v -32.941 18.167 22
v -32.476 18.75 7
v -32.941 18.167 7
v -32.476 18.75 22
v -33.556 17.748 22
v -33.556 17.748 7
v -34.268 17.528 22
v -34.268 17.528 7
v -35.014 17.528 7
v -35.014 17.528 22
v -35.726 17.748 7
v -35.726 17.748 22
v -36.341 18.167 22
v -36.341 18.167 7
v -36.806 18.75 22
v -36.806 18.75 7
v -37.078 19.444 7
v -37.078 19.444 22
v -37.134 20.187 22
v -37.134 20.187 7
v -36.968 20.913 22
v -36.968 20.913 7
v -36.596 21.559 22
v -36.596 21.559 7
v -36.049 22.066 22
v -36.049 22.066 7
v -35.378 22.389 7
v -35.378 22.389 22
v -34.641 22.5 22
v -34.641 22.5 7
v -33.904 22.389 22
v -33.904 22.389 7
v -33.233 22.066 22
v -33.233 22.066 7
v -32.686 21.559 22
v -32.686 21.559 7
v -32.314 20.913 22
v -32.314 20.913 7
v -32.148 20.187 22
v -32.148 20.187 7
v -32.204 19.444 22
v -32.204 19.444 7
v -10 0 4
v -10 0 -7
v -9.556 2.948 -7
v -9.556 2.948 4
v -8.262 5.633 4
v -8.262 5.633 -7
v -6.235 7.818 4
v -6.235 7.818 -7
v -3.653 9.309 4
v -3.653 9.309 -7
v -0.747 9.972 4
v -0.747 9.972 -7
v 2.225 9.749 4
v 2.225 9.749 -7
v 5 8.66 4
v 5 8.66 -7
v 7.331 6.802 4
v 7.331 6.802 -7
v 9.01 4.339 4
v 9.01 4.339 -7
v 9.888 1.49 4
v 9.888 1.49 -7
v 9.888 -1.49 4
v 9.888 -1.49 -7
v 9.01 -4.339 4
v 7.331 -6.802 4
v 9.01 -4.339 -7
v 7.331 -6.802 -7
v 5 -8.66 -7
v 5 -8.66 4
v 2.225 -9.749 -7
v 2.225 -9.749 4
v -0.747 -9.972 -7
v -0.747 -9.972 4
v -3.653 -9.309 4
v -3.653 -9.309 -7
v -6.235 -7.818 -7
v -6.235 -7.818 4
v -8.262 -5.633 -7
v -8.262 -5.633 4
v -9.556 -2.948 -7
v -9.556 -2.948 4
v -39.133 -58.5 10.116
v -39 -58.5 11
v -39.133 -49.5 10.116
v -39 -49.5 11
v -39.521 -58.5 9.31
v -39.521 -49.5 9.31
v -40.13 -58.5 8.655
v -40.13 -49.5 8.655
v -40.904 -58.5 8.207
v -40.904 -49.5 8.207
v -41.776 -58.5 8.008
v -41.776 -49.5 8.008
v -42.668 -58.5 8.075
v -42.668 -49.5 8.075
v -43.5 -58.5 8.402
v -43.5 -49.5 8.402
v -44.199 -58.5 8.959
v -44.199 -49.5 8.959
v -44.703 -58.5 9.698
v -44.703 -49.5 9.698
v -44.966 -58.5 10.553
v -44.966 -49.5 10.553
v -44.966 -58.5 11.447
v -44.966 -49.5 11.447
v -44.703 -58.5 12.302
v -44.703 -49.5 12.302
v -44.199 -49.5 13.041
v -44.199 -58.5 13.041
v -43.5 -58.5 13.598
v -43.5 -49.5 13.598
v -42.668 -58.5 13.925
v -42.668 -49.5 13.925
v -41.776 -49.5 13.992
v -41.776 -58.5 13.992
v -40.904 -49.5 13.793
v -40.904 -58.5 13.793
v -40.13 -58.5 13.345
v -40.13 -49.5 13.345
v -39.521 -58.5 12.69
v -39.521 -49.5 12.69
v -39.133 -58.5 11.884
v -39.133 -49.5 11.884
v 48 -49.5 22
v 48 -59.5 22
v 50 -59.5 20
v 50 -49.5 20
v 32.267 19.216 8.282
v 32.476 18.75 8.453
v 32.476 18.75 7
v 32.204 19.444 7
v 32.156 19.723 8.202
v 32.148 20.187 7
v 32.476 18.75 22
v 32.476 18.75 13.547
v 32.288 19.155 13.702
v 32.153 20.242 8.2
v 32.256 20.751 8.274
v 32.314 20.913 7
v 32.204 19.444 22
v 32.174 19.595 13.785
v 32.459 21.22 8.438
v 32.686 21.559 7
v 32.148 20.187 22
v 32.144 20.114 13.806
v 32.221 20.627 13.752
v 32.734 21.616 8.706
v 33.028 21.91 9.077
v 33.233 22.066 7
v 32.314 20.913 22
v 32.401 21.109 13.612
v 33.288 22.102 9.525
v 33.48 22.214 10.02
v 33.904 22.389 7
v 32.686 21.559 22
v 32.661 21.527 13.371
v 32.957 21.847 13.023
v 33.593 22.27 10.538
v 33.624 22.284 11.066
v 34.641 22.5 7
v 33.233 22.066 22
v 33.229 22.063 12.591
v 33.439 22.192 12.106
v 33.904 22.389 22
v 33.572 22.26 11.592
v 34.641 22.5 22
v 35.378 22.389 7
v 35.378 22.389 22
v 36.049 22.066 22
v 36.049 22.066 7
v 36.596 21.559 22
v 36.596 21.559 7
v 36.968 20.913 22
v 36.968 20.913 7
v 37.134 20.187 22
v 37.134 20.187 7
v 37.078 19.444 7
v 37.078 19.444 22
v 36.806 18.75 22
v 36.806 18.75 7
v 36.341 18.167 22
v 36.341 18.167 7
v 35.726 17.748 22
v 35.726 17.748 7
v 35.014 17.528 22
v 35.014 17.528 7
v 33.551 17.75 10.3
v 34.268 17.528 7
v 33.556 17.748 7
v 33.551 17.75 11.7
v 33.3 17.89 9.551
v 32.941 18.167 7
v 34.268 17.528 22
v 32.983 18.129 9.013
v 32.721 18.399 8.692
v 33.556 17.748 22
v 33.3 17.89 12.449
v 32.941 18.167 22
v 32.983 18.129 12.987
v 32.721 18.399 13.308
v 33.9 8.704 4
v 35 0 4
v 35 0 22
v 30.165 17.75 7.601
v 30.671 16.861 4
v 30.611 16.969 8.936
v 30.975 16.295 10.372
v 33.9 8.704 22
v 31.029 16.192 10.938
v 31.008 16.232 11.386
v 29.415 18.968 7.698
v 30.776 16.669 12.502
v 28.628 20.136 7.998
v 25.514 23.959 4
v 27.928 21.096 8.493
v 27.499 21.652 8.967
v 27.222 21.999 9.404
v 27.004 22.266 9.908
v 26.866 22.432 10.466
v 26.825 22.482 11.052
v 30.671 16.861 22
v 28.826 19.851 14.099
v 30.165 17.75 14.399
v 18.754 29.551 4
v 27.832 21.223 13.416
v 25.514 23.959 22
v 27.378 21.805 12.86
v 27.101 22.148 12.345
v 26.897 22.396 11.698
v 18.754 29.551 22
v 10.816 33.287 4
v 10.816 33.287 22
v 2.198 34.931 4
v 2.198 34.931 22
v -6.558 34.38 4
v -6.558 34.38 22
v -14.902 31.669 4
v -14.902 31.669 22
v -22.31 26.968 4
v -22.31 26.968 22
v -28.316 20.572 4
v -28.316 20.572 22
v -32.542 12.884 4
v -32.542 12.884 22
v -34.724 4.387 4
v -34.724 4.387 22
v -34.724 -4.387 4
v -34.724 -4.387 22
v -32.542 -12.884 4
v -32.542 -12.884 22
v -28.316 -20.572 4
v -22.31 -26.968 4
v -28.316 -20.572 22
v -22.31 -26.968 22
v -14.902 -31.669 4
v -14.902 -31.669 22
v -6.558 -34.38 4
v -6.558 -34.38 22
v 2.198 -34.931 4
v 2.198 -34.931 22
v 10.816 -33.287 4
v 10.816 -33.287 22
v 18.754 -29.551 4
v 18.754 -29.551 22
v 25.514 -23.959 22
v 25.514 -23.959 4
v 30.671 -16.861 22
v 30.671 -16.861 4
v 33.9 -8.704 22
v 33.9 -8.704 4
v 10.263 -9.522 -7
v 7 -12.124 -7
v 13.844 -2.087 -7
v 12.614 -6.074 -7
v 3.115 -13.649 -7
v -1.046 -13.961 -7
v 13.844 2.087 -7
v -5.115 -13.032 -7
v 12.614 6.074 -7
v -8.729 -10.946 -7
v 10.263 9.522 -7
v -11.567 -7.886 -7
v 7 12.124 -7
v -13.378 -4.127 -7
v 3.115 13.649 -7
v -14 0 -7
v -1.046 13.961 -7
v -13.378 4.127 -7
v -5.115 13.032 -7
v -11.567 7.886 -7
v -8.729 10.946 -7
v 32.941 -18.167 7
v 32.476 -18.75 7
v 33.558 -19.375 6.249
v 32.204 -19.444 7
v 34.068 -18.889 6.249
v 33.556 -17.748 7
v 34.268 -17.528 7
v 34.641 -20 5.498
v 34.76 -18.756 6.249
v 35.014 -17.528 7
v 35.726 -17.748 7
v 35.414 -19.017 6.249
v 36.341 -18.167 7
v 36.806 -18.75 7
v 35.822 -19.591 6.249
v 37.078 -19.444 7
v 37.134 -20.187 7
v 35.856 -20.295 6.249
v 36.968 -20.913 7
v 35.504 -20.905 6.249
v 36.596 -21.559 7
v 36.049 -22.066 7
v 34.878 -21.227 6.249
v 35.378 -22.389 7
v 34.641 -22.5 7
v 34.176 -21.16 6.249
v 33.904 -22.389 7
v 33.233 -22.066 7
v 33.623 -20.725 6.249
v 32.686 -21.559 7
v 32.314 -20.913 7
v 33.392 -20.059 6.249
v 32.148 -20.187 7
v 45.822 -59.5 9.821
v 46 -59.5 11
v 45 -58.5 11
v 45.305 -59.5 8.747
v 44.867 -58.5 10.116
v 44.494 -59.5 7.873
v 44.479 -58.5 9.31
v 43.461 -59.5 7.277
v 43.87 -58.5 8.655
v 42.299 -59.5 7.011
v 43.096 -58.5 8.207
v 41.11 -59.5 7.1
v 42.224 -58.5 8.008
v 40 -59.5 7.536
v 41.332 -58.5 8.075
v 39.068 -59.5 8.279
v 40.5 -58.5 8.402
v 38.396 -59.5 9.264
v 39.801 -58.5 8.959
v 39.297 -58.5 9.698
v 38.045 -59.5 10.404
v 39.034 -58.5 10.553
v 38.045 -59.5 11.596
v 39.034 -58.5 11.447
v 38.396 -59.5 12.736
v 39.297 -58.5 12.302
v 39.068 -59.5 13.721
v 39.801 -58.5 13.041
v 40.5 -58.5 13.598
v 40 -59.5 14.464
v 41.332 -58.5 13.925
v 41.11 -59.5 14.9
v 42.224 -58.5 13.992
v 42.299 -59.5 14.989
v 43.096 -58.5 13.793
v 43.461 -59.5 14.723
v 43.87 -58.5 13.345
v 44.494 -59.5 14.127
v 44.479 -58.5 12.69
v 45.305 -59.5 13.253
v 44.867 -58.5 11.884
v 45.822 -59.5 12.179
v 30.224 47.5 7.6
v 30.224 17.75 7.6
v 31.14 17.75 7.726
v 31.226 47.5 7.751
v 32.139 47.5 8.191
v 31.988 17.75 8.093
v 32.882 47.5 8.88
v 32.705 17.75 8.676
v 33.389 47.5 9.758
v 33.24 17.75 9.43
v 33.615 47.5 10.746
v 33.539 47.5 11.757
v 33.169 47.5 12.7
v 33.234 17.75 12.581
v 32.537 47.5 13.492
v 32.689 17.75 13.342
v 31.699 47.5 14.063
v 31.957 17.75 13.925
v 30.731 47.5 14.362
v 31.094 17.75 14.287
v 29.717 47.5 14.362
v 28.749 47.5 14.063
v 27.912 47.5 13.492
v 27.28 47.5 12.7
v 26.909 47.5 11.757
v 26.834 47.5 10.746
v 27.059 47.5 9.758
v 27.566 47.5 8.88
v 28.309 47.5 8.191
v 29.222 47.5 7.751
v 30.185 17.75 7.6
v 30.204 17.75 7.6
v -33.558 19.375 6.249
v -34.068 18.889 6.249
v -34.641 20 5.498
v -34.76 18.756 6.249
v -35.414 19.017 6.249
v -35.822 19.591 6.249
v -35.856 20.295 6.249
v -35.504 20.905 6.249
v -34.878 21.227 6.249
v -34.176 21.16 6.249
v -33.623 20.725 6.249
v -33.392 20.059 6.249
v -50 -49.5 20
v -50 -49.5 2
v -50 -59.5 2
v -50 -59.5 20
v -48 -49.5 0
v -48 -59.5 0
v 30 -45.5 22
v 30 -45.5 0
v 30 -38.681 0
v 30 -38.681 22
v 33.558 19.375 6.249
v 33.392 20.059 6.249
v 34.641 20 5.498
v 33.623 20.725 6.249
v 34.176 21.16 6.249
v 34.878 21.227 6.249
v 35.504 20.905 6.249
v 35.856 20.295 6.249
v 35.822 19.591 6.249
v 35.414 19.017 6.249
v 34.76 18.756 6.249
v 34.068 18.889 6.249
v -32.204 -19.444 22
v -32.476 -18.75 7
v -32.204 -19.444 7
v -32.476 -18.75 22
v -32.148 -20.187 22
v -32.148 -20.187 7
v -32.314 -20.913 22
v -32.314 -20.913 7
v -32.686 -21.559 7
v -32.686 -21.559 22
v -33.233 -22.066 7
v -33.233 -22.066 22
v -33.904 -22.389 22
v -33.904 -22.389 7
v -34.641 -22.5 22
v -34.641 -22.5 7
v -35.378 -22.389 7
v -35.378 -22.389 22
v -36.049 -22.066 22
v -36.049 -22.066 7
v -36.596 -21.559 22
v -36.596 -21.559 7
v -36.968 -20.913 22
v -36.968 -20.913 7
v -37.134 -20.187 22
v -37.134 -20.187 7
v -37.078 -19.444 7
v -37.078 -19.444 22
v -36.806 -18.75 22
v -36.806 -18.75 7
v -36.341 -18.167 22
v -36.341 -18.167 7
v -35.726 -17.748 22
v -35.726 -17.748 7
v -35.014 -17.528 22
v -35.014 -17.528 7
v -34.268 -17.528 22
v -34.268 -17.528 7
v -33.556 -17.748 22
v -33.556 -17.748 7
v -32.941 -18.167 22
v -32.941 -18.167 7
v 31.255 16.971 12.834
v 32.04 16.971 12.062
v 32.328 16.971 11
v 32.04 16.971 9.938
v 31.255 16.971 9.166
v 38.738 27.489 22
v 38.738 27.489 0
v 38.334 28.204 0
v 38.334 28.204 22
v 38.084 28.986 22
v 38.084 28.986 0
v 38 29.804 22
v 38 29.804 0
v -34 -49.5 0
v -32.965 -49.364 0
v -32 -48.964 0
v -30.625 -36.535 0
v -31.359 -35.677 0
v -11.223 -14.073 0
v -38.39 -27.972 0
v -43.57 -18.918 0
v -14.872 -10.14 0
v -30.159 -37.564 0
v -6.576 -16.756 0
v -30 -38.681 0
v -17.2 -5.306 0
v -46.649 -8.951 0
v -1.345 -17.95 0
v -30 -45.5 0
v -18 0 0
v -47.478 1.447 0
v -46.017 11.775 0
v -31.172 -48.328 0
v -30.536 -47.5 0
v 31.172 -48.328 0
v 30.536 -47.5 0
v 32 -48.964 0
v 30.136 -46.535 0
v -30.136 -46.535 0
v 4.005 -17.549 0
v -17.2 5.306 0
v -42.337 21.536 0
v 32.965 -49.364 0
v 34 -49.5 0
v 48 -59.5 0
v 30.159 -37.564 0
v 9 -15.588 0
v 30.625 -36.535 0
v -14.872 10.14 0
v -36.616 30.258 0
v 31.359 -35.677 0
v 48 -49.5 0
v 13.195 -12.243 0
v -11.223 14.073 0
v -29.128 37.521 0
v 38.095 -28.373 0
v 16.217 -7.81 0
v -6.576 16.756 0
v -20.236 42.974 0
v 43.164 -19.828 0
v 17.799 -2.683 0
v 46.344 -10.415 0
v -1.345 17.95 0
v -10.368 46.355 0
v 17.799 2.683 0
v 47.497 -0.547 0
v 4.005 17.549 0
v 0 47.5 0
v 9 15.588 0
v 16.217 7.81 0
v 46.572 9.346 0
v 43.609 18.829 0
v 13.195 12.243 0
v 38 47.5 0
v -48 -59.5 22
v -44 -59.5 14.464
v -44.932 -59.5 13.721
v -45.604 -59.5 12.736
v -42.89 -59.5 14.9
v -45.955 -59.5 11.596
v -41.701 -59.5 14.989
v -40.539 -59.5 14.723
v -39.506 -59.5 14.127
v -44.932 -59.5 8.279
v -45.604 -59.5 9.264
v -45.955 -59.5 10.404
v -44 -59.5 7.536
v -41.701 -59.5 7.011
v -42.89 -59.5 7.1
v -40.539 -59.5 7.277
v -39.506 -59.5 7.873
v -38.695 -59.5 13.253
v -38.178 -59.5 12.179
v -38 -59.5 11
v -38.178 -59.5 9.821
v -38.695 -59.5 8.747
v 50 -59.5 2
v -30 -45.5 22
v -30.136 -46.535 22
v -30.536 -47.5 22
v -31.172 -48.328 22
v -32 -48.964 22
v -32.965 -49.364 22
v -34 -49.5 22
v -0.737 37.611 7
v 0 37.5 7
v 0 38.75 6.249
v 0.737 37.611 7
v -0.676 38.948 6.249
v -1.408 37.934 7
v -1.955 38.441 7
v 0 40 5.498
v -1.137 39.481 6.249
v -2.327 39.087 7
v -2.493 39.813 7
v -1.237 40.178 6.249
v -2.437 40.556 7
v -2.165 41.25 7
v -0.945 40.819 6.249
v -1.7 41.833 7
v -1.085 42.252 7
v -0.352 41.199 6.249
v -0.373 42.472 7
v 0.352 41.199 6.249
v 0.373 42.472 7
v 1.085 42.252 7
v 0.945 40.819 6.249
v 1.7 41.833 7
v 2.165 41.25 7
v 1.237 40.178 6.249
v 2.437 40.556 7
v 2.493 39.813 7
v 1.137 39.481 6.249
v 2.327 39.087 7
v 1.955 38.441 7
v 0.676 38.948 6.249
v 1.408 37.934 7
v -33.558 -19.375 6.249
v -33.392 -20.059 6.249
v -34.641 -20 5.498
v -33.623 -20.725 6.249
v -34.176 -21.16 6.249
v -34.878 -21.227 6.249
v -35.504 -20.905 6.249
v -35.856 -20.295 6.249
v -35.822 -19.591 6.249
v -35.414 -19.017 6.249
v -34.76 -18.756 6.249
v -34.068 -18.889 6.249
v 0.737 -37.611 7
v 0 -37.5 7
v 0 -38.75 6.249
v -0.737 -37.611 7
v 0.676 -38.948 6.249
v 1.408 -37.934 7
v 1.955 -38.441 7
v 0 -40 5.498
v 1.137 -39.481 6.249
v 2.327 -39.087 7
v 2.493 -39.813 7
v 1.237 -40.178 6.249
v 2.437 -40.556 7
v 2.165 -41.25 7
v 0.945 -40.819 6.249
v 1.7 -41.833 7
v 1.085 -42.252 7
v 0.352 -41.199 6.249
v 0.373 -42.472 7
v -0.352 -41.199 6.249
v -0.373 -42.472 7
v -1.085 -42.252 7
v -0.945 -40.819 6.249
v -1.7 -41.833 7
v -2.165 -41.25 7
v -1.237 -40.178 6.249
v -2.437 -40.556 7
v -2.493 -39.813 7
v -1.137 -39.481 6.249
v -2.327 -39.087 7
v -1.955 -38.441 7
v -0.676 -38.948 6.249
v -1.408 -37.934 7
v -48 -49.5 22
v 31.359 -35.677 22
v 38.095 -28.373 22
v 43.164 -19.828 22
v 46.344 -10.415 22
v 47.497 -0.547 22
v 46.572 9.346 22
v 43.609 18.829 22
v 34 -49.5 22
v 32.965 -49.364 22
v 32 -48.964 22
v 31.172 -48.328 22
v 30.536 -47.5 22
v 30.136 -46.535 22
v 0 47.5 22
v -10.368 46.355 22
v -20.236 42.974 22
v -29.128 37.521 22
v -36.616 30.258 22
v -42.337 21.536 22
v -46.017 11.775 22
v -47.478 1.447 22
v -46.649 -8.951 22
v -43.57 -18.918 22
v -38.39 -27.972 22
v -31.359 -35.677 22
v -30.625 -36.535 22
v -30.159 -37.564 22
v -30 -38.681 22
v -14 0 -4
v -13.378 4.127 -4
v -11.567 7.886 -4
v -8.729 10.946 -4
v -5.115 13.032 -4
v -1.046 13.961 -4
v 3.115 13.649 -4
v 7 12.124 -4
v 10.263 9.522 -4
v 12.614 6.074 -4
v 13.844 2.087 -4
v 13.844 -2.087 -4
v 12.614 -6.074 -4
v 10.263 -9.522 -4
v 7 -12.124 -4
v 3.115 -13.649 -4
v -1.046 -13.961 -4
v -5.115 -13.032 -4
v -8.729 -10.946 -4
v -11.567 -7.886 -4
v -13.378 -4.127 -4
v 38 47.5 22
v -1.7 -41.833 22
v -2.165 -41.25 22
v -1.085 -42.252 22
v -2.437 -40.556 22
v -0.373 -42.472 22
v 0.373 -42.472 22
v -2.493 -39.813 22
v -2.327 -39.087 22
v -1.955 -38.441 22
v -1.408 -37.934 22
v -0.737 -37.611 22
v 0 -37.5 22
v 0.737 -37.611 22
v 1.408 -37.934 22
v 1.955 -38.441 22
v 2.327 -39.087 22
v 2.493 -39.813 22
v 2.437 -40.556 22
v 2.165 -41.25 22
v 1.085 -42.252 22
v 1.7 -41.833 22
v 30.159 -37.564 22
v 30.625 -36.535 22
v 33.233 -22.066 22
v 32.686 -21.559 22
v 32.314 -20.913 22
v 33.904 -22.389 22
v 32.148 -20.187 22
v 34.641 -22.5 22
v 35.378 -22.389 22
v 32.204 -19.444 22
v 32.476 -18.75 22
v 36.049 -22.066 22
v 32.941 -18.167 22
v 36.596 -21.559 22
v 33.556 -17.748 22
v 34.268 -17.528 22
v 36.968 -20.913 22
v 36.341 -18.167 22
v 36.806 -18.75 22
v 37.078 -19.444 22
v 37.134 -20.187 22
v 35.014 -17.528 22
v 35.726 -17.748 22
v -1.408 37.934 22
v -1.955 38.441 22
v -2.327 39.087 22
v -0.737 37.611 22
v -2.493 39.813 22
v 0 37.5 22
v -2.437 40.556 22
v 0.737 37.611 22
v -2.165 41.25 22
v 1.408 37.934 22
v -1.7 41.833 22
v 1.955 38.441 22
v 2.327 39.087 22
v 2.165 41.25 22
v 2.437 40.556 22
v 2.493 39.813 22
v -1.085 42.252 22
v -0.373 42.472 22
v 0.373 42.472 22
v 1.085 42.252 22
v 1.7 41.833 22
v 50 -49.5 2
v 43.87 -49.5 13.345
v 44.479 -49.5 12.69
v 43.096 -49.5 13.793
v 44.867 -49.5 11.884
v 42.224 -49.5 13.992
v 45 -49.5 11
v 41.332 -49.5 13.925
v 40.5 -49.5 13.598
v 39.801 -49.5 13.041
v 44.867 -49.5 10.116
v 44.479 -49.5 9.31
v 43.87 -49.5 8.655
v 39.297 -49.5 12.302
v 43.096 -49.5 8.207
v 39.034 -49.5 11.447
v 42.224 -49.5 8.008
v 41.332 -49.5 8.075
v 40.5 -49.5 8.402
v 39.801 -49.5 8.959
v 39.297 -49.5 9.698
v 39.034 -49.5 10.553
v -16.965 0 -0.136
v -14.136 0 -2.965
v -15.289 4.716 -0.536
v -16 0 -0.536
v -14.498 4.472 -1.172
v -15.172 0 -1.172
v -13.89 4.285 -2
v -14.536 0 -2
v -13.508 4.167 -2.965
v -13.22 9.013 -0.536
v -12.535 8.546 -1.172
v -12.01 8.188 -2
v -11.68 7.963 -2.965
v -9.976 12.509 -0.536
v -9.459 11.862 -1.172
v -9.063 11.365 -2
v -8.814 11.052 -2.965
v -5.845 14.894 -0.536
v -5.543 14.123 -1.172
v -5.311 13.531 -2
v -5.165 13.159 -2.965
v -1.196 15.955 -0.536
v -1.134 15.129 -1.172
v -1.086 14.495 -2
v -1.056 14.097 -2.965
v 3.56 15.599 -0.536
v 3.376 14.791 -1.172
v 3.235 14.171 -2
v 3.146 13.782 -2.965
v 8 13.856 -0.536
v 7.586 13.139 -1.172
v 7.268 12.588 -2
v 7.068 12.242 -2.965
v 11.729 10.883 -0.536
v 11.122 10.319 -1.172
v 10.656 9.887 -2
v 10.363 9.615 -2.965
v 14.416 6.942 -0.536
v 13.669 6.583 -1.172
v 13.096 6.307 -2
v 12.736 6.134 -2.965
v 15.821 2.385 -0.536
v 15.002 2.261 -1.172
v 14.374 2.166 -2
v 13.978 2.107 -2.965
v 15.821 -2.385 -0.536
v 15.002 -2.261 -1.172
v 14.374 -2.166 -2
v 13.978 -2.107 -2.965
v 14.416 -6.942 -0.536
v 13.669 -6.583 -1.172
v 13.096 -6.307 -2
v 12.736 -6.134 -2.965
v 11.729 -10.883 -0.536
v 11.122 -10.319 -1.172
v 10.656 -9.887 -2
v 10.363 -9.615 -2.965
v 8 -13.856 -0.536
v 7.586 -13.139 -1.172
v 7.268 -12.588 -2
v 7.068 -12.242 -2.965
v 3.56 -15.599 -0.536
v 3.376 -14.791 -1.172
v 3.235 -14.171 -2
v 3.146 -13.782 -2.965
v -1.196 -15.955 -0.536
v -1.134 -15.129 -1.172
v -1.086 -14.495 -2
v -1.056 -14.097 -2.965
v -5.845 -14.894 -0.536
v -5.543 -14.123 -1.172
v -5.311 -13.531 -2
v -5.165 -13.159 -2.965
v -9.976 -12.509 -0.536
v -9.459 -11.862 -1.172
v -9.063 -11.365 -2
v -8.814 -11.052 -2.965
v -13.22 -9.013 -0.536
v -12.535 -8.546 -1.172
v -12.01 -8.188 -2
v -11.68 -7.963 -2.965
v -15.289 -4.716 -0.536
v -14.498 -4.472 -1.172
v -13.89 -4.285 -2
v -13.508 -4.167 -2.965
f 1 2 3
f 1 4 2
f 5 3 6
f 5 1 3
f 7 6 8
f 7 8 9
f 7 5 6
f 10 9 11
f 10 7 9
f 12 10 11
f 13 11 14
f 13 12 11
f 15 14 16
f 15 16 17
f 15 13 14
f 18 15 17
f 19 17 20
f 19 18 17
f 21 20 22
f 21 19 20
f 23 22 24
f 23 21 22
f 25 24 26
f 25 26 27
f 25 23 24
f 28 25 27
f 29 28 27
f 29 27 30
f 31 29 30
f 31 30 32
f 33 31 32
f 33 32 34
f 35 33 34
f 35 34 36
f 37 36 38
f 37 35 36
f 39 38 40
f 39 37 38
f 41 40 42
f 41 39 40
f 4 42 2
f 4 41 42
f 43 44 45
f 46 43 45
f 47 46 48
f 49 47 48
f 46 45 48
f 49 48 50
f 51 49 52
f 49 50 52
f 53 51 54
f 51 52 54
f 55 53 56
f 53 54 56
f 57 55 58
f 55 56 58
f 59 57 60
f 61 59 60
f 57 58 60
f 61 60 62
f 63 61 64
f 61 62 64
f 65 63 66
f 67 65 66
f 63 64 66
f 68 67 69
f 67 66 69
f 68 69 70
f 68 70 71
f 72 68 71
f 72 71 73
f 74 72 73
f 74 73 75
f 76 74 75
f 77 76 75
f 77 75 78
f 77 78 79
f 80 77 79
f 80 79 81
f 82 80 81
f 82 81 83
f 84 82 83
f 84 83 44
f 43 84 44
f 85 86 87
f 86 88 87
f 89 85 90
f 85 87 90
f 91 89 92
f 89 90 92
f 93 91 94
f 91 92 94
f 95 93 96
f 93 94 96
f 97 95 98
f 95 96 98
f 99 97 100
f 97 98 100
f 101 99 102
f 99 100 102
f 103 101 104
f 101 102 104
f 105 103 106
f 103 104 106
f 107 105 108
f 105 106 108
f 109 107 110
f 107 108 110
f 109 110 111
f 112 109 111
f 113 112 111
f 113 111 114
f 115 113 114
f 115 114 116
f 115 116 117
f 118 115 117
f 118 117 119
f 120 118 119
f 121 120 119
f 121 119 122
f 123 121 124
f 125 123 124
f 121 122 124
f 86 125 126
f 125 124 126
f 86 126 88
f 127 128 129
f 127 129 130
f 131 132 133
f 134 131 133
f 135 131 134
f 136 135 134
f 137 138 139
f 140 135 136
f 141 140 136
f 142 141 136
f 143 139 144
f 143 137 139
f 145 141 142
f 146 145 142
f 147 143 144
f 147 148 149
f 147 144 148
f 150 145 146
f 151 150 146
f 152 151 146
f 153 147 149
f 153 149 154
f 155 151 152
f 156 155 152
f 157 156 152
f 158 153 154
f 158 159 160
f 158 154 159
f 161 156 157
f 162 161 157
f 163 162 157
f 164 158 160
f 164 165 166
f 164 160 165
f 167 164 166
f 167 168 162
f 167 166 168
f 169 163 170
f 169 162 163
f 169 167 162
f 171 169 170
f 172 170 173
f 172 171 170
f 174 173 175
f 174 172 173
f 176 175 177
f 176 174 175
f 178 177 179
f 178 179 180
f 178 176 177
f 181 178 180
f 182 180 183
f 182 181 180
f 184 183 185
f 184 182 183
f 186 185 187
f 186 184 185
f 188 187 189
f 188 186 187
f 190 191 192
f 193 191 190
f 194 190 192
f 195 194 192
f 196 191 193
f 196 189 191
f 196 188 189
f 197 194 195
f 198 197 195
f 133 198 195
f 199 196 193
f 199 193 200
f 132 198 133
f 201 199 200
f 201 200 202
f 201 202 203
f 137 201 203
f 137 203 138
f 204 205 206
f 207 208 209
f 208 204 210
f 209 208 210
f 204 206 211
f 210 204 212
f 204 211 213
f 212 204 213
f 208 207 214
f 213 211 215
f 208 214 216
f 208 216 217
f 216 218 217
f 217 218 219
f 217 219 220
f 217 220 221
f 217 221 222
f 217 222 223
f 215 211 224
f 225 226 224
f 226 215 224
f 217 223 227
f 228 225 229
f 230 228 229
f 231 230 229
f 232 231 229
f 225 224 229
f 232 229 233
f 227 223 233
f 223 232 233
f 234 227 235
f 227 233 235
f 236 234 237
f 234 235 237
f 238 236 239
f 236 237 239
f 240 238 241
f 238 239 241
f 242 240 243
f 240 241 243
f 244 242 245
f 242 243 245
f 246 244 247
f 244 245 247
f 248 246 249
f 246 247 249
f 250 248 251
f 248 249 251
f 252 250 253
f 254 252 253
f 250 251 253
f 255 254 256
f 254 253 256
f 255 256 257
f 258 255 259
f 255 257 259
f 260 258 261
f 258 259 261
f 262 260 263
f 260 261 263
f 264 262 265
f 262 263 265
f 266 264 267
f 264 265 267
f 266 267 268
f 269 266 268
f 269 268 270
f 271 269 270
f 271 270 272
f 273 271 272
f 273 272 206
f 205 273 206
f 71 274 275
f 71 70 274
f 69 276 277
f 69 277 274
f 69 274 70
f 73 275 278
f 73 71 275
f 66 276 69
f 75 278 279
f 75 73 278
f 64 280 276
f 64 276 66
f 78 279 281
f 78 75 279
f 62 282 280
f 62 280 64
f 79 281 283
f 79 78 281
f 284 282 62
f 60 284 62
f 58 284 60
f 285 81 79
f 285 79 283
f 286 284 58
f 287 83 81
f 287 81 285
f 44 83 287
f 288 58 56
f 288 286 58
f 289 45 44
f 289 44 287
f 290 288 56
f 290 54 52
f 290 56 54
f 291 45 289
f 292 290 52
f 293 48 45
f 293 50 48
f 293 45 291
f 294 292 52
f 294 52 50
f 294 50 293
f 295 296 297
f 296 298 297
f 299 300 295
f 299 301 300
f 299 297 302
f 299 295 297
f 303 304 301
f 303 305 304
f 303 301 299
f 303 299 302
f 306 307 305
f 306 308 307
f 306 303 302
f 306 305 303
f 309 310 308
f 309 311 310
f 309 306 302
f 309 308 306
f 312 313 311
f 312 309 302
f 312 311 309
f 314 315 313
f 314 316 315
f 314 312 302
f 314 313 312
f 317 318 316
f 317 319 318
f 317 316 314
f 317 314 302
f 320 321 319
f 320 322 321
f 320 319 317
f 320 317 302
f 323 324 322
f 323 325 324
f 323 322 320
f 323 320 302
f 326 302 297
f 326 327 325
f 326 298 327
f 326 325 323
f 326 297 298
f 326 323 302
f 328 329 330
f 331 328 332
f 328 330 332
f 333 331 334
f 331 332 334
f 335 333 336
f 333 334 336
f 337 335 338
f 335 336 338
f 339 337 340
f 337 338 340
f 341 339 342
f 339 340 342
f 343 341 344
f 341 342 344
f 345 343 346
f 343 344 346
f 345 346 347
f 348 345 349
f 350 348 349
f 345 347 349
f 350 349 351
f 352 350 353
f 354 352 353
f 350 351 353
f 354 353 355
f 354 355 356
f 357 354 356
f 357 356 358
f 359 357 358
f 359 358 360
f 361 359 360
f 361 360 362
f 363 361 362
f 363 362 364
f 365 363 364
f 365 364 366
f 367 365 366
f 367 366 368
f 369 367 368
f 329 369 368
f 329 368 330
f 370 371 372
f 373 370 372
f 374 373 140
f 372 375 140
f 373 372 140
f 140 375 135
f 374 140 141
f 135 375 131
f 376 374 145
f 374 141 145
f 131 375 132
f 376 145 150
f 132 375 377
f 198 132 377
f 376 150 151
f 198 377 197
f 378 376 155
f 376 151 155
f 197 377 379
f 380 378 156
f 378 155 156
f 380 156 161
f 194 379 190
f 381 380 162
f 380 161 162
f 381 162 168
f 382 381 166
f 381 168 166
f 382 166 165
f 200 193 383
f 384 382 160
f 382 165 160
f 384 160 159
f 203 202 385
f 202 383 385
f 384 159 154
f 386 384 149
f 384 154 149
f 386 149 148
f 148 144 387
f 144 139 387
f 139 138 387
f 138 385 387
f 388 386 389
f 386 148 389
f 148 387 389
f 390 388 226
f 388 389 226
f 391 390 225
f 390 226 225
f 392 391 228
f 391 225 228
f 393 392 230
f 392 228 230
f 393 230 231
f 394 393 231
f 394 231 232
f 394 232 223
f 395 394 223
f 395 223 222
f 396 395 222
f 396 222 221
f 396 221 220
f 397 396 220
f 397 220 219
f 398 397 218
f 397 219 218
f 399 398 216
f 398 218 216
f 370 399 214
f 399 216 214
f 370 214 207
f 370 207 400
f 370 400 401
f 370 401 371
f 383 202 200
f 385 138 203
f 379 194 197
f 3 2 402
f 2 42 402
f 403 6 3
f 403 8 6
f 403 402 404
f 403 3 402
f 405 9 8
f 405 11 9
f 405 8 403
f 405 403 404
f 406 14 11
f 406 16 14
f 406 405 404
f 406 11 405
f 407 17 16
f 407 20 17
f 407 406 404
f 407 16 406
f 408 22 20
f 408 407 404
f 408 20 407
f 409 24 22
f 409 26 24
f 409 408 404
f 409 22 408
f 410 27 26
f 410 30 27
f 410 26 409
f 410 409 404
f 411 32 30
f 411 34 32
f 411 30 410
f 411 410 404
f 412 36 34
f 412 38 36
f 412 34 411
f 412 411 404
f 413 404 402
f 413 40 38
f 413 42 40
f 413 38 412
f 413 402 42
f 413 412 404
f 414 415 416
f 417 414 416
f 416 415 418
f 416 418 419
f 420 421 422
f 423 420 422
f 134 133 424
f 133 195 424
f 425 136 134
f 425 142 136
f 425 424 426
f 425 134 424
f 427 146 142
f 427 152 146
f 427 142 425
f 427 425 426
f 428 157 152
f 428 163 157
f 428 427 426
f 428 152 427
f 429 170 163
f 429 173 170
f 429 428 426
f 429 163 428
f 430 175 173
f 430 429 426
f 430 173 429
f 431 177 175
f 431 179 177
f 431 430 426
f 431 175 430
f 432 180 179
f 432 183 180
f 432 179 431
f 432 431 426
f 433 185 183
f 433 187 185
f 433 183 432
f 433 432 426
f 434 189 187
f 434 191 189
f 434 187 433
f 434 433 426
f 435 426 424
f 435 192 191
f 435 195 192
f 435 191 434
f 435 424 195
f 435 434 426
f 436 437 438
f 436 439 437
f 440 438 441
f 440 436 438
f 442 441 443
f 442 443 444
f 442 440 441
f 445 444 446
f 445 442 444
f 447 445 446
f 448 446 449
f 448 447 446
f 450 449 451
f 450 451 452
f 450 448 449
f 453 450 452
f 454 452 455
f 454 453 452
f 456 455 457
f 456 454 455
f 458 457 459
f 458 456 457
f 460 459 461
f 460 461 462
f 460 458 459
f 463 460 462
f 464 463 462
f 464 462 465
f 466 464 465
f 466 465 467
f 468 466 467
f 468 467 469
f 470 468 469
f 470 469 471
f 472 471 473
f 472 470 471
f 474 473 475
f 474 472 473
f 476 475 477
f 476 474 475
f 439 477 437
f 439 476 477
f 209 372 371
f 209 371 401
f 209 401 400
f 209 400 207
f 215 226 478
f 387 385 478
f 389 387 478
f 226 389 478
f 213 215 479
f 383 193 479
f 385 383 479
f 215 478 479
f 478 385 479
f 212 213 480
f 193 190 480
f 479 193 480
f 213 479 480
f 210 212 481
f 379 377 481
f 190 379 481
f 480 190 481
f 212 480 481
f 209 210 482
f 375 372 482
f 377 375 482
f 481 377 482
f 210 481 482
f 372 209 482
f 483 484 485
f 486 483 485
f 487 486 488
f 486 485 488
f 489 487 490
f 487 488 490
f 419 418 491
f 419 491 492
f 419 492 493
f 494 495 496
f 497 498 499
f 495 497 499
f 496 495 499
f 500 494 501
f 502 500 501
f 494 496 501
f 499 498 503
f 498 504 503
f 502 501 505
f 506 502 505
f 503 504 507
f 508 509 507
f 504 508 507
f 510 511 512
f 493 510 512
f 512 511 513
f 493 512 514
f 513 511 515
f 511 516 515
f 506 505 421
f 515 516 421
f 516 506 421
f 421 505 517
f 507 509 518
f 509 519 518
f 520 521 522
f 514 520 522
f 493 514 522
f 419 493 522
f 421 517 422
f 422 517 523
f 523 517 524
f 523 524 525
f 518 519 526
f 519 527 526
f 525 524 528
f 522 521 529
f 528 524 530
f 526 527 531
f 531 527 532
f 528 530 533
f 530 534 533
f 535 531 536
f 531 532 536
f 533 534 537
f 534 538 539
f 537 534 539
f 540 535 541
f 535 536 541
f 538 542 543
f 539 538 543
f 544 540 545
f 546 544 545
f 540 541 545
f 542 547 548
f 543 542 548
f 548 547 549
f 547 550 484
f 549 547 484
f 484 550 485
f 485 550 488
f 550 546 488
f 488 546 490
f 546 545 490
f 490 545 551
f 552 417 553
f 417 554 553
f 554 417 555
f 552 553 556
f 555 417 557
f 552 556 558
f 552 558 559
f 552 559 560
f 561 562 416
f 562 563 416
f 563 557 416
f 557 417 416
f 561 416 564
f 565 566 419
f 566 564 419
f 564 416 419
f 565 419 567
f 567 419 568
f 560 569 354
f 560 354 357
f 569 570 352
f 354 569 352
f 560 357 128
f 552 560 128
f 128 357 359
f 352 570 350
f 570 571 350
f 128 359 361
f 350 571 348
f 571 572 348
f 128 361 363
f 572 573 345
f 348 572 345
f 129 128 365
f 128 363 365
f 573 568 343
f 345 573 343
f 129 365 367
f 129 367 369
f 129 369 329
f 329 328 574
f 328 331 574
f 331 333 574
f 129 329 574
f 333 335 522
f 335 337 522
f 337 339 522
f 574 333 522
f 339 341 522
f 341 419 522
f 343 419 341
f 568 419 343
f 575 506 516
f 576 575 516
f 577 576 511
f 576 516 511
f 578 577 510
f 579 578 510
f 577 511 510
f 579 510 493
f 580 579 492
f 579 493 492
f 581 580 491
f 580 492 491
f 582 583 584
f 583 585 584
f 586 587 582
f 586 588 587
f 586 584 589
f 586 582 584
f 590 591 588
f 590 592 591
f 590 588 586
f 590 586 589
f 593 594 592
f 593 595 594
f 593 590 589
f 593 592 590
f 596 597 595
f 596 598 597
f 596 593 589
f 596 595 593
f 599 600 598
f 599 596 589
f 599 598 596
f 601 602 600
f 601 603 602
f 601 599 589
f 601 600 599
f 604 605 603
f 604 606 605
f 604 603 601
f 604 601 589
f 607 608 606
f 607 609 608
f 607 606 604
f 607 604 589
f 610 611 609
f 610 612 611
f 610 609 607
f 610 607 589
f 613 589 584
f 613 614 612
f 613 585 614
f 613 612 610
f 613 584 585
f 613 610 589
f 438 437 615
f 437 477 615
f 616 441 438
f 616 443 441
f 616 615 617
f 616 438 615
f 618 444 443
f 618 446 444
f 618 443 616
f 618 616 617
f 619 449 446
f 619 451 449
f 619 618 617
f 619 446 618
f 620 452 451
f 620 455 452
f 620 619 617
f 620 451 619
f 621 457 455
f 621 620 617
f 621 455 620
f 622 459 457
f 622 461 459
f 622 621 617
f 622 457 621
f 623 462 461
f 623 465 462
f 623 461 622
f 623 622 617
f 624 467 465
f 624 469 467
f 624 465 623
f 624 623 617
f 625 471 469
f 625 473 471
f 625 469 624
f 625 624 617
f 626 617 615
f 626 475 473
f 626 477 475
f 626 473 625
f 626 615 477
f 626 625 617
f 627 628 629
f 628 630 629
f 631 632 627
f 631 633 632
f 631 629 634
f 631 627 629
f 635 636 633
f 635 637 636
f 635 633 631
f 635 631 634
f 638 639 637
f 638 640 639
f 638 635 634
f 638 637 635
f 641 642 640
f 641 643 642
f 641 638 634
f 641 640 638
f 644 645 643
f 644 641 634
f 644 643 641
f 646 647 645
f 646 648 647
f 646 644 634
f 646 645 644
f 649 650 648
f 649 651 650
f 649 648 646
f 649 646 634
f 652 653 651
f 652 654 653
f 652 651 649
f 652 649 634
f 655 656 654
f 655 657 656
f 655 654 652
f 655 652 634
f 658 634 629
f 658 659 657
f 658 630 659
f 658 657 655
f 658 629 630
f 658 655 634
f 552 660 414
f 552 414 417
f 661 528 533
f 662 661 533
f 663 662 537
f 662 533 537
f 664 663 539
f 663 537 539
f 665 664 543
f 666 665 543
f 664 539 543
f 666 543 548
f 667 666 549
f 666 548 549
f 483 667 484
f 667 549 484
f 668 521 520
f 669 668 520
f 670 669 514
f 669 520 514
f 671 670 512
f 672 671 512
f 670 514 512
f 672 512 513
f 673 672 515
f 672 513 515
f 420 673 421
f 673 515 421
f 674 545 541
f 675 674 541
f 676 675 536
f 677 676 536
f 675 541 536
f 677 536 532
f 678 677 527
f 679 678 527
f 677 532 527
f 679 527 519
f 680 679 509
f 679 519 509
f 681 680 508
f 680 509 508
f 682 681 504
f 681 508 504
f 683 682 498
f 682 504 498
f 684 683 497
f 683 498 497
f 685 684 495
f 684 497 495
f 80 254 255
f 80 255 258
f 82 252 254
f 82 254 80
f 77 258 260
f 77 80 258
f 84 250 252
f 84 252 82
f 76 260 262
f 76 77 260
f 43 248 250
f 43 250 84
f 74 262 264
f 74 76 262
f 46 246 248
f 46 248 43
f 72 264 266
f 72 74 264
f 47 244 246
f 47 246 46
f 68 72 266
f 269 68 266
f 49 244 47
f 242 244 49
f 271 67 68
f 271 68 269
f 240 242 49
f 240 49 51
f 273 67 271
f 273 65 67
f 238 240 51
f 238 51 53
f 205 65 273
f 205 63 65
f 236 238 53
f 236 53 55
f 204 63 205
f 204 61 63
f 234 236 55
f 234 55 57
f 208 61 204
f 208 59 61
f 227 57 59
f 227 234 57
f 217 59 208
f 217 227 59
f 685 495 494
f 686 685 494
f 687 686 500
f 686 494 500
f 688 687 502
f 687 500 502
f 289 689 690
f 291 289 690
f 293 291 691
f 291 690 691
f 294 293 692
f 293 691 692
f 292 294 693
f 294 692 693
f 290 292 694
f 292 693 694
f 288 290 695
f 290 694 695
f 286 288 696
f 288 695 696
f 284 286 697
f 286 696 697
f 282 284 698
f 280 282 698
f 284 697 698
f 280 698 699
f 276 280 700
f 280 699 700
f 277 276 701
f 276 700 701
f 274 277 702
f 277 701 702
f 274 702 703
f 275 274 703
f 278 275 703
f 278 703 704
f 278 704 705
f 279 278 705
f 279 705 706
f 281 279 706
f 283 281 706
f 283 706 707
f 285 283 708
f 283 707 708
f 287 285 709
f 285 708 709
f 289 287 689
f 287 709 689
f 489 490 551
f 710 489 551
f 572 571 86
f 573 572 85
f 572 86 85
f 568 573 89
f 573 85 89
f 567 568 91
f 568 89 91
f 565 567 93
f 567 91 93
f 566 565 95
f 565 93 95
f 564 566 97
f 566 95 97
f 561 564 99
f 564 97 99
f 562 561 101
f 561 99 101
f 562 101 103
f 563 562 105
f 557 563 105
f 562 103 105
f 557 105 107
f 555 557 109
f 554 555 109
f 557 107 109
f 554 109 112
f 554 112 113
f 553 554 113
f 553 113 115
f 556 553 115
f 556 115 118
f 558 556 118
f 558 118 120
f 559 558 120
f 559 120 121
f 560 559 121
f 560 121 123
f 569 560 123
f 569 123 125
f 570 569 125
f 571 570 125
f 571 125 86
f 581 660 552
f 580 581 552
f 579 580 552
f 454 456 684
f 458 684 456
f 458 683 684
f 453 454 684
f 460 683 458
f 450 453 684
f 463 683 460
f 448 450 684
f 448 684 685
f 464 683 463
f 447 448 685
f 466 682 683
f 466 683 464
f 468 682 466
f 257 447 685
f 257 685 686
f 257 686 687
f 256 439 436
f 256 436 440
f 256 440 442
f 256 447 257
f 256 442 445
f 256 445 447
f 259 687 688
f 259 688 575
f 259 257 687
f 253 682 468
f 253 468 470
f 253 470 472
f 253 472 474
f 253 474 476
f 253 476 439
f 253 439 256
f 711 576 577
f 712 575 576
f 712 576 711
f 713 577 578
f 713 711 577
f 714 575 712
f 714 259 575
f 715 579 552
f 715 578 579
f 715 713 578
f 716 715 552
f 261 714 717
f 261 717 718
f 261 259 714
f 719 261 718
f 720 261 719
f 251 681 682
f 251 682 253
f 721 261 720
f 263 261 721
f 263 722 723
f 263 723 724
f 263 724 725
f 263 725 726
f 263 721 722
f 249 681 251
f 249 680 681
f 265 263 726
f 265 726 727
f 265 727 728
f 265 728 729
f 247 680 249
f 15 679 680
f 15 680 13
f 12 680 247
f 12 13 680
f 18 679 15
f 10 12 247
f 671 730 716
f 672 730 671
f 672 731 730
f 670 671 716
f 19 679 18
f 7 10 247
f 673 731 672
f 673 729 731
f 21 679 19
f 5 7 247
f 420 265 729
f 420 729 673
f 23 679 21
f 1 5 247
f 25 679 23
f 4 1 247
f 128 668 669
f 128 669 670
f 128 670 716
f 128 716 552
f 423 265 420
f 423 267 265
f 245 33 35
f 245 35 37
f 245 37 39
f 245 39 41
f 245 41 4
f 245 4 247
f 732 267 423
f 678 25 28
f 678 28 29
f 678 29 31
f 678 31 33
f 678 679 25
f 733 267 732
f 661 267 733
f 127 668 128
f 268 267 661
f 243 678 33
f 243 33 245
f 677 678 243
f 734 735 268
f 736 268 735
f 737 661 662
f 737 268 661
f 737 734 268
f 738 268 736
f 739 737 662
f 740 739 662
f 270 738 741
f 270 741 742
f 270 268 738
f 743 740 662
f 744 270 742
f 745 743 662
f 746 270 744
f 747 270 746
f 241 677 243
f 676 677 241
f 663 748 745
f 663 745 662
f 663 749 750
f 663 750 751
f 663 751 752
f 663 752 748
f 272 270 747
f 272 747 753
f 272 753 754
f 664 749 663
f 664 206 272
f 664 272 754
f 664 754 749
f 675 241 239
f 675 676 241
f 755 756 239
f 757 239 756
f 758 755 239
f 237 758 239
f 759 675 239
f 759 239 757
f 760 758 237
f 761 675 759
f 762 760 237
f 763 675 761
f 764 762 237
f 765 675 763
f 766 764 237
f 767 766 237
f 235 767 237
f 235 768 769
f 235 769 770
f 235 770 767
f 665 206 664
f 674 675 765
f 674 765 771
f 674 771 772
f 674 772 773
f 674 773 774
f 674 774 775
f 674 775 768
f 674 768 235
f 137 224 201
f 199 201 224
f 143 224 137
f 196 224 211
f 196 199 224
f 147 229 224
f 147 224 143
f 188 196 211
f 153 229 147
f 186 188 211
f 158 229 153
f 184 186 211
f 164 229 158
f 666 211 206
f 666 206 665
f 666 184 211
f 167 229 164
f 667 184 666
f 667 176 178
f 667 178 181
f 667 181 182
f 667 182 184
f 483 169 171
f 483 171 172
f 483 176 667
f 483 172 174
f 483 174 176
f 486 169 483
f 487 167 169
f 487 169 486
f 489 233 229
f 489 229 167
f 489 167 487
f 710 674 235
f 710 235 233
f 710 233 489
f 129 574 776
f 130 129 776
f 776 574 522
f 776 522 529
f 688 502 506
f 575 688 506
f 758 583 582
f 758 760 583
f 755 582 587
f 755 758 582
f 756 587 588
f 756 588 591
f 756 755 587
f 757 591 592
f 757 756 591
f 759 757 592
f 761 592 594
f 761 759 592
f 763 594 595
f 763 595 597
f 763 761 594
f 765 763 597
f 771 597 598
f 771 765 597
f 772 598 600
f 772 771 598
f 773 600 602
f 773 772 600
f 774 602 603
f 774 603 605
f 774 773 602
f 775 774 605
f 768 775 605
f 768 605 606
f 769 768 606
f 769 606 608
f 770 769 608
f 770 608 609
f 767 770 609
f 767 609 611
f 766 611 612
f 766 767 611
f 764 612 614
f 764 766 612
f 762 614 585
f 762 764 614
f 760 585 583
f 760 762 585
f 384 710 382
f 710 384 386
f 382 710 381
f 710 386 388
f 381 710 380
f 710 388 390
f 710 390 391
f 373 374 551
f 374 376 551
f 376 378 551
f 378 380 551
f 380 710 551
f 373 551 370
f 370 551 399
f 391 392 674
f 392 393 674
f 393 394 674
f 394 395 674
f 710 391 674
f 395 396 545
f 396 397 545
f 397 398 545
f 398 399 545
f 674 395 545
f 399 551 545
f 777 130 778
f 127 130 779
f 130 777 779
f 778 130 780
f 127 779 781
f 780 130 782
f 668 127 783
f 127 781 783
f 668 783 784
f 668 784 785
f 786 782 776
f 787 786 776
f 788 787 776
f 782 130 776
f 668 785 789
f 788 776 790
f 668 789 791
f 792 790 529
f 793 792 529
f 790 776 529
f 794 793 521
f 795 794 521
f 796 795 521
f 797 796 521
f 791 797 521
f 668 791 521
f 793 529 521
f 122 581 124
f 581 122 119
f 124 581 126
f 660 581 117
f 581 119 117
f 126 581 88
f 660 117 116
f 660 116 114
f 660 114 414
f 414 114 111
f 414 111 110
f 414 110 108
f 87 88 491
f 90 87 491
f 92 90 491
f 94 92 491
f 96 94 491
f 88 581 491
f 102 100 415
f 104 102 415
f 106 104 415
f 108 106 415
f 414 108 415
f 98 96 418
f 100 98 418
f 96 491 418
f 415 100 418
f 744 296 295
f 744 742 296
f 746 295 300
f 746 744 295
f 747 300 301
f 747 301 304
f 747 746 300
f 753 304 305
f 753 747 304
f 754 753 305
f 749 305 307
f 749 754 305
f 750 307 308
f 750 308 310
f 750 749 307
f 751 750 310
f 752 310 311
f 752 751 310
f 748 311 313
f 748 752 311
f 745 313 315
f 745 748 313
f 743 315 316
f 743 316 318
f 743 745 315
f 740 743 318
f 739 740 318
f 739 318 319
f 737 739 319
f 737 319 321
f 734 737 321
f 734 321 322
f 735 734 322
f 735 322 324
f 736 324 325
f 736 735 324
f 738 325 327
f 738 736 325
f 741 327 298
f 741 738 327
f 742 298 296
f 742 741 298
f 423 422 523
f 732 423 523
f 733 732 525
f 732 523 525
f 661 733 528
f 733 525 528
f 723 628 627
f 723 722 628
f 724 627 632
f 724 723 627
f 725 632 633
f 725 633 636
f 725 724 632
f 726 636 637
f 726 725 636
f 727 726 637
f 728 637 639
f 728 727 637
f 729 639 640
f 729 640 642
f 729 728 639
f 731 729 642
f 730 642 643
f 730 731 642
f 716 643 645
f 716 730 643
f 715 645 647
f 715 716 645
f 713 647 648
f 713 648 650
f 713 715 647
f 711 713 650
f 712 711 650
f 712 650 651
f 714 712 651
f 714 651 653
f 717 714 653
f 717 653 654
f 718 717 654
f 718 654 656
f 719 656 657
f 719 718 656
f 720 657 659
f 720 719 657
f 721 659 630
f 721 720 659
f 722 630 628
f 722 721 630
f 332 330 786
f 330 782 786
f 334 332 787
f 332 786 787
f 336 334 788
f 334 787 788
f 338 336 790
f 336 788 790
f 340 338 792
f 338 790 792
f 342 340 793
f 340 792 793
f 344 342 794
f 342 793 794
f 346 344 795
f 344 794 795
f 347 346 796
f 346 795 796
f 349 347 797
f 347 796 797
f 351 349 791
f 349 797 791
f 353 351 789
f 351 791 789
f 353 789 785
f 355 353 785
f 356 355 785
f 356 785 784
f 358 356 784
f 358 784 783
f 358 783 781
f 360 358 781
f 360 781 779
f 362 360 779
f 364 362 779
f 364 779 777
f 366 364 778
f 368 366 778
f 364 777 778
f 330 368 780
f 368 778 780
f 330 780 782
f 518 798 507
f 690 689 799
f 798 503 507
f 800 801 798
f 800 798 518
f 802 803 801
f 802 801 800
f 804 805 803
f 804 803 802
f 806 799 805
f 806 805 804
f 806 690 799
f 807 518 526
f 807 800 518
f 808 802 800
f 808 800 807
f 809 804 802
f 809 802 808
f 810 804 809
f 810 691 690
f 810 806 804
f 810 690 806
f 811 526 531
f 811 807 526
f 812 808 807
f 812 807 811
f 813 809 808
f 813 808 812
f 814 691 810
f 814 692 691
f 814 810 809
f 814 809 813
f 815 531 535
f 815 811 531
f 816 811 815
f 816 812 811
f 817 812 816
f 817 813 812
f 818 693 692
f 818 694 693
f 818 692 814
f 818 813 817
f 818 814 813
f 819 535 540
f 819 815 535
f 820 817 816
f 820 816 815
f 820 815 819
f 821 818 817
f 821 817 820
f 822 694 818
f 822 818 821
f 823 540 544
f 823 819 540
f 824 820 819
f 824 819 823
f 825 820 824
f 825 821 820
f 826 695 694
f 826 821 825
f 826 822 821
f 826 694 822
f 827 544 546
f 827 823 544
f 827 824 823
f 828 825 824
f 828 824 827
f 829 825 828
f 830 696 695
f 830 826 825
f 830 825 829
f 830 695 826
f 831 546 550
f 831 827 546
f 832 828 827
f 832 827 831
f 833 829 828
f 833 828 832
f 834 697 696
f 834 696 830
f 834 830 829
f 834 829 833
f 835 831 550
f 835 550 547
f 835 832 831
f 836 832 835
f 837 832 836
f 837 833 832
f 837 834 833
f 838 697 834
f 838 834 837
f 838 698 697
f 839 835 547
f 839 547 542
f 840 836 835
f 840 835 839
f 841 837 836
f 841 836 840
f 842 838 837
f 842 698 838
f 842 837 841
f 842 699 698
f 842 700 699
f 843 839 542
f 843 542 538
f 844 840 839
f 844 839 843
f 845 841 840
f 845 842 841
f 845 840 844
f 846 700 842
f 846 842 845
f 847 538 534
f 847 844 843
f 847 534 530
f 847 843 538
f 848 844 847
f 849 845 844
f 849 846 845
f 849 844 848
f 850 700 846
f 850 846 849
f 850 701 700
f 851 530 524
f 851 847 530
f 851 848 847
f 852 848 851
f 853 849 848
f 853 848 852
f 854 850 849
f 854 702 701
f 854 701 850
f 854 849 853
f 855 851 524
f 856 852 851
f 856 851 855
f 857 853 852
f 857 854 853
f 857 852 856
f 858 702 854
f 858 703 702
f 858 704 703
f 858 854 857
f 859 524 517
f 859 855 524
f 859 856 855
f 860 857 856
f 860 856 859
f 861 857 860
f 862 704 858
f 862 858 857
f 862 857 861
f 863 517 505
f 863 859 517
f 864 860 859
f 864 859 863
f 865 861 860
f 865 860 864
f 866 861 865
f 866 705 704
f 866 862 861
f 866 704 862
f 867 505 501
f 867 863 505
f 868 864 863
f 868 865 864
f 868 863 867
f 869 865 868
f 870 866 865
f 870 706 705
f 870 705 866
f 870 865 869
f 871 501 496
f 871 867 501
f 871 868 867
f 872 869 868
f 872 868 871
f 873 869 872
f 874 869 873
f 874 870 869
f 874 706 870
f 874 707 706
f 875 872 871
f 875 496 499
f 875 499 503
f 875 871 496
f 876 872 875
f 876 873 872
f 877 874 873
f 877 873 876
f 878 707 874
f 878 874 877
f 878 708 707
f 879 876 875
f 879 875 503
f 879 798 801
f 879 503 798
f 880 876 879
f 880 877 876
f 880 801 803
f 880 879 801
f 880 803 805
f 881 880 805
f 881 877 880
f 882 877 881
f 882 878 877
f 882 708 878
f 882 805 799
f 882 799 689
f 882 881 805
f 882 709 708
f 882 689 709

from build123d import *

# Parameters (mm, degrees)
BOSS_EXTRUDE1_DEPTH                                 = 22
SKETCH3_R                                           = 35
CUT_EXTRUDE1_DEPTH                                  = 18
SKETCH4_R                                           = 14
BOSS_EXTRUDE2_DEPTH                                 = 7
FILLET1_R                                           = 4
SKETCH5_R                                           = 10
CUT_EXTRUDE2_DEPTH                                  = 30
CHAMFER1_SIZE                                       = 2
M8X1_25_TAPPED_HOLE1_D                              = 6.8
M8X1_25_TAPPED_HOLE1_DEPTH                          = 29.75
M8X1_25_TAPPED_HOLE1_TIP                            = 2.042926105
CIRPATTERN1_COUNT                                   = 6
CSK_FOR_M6_COUNTERSUNK_FLAT_HEAD_SCREW2_D           = 6
CSK_FOR_M6_COUNTERSUNK_FLAT_HEAD_SCREW2_DEPTH       = 20
CSK_FOR_M6_COUNTERSUNK_FLAT_HEAD_SCREW2_CSINK_D     = 8
CSK_FOR_M6_COUNTERSUNK_FLAT_HEAD_SCREW2_CSINK_ANGLE = 90
CSK_FOR_M6_COUNTERSUNK_FLAT_HEAD_SCREW2_TIP         = 1.802581857


with BuildPart() as part:
    # Sketch2 → Boss-Extrude1 (new body)
    with BuildSketch(Plane.XY):
        with BuildLine():
            Line((-50, -59.5), (50, -59.5))
            Line((50, -59.5), (50, -49.5))
            Line((50, -49.5), (34, -49.5))
            ThreePointArc((34, -49.5), (31.171572875, -48.328427125), (30, -45.5))
            Line((30, -45.5), (30, -38.681390875))
            ThreePointArc((30, -38.681390875), (30.35561344, -37.032619635), (31.359223301, -35.677011001))
            ThreePointArc((31.359223301, -35.677011001), (47.179198283, -5.511193099), (38.737864078, 27.488686522))
            ThreePointArc((38.737864078, 27.488686522), (38.18892773, 28.588727762), (38, 29.803523282))
            Line((38, 29.803523282), (38, 47.5))
            Line((38, 47.5), (0, 47.5))
            ThreePointArc((0, 47.5), (-44.446079819, 16.756968363), (-31.359223301, -35.677011001))
            ThreePointArc((-31.359223301, -35.677011001), (-30.35561344, -37.032619635), (-30, -38.681390875))
            Line((-30, -38.681390875), (-30, -45.5))
            ThreePointArc((-30, -45.5), (-31.171572875, -48.328427125), (-34, -49.5))
            Line((-34, -49.5), (-50, -49.5))
            Line((-50, -49.5), (-50, -59.5))
        make_face()
    extrude(amount=BOSS_EXTRUDE1_DEPTH)

    # Sketch3 → Cut-Extrude1 (cut)
    with BuildSketch(Plane.XY.offset(22)):
        Circle(SKETCH3_R)
    extrude(amount=-CUT_EXTRUDE1_DEPTH, mode=Mode.SUBTRACT)

    # Sketch4 → Boss-Extrude2 (add)
    with BuildSketch(Plane(origin=(0, 0, 0), x_dir=(-1, 0, 0), z_dir=(0, 0, -1))):
        Circle(SKETCH4_R)
    extrude(amount=BOSS_EXTRUDE2_DEPTH)

    # Fillet1
    fillet1_edges = [part.edges().sort_by_distance(p)[0] for p in [
        (14, 0, 0),
    ]]
    fillet(fillet1_edges, radius=FILLET1_R)

    # Sketch5 → Cut-Extrude2 (cut, through all)
    with BuildSketch(Plane(origin=(0, 0, -7), x_dir=(-1, 0, 0), z_dir=(0, 0, -1))):
        Circle(SKETCH5_R)
    extrude(amount=-CUT_EXTRUDE2_DEPTH, mode=Mode.SUBTRACT)

    # Chamfer1
    chamfer1_edges = [part.edges().sort_by_distance(p)[0] for p in [
        (50, -54.5, 0),
        (-50, -54.5, 0),
        (-50, -54.5, 22),
        (50, -54.5, 22),
    ]]
    chamfer(chamfer1_edges, length=CHAMFER1_SIZE)

    # M8x1.25 Tapped Hole1
    with Locations(Plane(origin=(30.22415, 47.5, 11), x_dir=(0, 0, 1), z_dir=(0, 1, 0))):
        with Locations((0, 0)):
            Hole(M8X1_25_TAPPED_HOLE1_D / 2, depth=M8X1_25_TAPPED_HOLE1_DEPTH)
            with Locations((0, 0, -(M8X1_25_TAPPED_HOLE1_DEPTH + M8X1_25_TAPPED_HOLE1_TIP / 2))):  # 118° drill point
                Cone(0, M8X1_25_TAPPED_HOLE1_D / 2, M8X1_25_TAPPED_HOLE1_TIP, mode=Mode.SUBTRACT)

    # Sketch11 → M6x1.0 Tapped Hole1 (revolve, cut)
    with BuildSketch(Plane(origin=(0, 40, 22), x_dir=(0, -1, 0), z_dir=(1, 0, 0))):
        Polygon((0, 0), (0, 16.502151548), (2.5, 15), (2.5, 0), align=None)
    m6x1_0_tapped_hole1 = revolve(axis=Axis((0, 40, 28.35), (0, 0, -1)), mode=Mode.SUBTRACT)

    # CirPattern1: M6x1.0 Tapped Hole1 ×6 about axis
    cirpattern1_axis = Axis((0, 0, 0), (0, 0, 1))
    for i in range(1, CIRPATTERN1_COUNT):
        add(m6x1_0_tapped_hole1.rotate(cirpattern1_axis, i * 360 / CIRPATTERN1_COUNT), mode=Mode.SUBTRACT)

    # CSK for M6 Countersunk Flat Head Screw2
    with Locations(Plane(origin=(0, -59.5, 0), x_dir=(-1, 0, 0), z_dir=(0, -1, 0))):
        with Locations((-42, -11), (42, -11)):
            CounterSinkHole(CSK_FOR_M6_COUNTERSUNK_FLAT_HEAD_SCREW2_D / 2, CSK_FOR_M6_COUNTERSUNK_FLAT_HEAD_SCREW2_CSINK_D / 2, depth=CSK_FOR_M6_COUNTERSUNK_FLAT_HEAD_SCREW2_DEPTH, counter_sink_angle=CSK_FOR_M6_COUNTERSUNK_FLAT_HEAD_SCREW2_CSINK_ANGLE)
            with Locations((0, 0, -(CSK_FOR_M6_COUNTERSUNK_FLAT_HEAD_SCREW2_DEPTH + CSK_FOR_M6_COUNTERSUNK_FLAT_HEAD_SCREW2_TIP / 2))):  # 118° drill point
                Cone(0, CSK_FOR_M6_COUNTERSUNK_FLAT_HEAD_SCREW2_D / 2, CSK_FOR_M6_COUNTERSUNK_FLAT_HEAD_SCREW2_TIP, mode=Mode.SUBTRACT)


solid = part.part
